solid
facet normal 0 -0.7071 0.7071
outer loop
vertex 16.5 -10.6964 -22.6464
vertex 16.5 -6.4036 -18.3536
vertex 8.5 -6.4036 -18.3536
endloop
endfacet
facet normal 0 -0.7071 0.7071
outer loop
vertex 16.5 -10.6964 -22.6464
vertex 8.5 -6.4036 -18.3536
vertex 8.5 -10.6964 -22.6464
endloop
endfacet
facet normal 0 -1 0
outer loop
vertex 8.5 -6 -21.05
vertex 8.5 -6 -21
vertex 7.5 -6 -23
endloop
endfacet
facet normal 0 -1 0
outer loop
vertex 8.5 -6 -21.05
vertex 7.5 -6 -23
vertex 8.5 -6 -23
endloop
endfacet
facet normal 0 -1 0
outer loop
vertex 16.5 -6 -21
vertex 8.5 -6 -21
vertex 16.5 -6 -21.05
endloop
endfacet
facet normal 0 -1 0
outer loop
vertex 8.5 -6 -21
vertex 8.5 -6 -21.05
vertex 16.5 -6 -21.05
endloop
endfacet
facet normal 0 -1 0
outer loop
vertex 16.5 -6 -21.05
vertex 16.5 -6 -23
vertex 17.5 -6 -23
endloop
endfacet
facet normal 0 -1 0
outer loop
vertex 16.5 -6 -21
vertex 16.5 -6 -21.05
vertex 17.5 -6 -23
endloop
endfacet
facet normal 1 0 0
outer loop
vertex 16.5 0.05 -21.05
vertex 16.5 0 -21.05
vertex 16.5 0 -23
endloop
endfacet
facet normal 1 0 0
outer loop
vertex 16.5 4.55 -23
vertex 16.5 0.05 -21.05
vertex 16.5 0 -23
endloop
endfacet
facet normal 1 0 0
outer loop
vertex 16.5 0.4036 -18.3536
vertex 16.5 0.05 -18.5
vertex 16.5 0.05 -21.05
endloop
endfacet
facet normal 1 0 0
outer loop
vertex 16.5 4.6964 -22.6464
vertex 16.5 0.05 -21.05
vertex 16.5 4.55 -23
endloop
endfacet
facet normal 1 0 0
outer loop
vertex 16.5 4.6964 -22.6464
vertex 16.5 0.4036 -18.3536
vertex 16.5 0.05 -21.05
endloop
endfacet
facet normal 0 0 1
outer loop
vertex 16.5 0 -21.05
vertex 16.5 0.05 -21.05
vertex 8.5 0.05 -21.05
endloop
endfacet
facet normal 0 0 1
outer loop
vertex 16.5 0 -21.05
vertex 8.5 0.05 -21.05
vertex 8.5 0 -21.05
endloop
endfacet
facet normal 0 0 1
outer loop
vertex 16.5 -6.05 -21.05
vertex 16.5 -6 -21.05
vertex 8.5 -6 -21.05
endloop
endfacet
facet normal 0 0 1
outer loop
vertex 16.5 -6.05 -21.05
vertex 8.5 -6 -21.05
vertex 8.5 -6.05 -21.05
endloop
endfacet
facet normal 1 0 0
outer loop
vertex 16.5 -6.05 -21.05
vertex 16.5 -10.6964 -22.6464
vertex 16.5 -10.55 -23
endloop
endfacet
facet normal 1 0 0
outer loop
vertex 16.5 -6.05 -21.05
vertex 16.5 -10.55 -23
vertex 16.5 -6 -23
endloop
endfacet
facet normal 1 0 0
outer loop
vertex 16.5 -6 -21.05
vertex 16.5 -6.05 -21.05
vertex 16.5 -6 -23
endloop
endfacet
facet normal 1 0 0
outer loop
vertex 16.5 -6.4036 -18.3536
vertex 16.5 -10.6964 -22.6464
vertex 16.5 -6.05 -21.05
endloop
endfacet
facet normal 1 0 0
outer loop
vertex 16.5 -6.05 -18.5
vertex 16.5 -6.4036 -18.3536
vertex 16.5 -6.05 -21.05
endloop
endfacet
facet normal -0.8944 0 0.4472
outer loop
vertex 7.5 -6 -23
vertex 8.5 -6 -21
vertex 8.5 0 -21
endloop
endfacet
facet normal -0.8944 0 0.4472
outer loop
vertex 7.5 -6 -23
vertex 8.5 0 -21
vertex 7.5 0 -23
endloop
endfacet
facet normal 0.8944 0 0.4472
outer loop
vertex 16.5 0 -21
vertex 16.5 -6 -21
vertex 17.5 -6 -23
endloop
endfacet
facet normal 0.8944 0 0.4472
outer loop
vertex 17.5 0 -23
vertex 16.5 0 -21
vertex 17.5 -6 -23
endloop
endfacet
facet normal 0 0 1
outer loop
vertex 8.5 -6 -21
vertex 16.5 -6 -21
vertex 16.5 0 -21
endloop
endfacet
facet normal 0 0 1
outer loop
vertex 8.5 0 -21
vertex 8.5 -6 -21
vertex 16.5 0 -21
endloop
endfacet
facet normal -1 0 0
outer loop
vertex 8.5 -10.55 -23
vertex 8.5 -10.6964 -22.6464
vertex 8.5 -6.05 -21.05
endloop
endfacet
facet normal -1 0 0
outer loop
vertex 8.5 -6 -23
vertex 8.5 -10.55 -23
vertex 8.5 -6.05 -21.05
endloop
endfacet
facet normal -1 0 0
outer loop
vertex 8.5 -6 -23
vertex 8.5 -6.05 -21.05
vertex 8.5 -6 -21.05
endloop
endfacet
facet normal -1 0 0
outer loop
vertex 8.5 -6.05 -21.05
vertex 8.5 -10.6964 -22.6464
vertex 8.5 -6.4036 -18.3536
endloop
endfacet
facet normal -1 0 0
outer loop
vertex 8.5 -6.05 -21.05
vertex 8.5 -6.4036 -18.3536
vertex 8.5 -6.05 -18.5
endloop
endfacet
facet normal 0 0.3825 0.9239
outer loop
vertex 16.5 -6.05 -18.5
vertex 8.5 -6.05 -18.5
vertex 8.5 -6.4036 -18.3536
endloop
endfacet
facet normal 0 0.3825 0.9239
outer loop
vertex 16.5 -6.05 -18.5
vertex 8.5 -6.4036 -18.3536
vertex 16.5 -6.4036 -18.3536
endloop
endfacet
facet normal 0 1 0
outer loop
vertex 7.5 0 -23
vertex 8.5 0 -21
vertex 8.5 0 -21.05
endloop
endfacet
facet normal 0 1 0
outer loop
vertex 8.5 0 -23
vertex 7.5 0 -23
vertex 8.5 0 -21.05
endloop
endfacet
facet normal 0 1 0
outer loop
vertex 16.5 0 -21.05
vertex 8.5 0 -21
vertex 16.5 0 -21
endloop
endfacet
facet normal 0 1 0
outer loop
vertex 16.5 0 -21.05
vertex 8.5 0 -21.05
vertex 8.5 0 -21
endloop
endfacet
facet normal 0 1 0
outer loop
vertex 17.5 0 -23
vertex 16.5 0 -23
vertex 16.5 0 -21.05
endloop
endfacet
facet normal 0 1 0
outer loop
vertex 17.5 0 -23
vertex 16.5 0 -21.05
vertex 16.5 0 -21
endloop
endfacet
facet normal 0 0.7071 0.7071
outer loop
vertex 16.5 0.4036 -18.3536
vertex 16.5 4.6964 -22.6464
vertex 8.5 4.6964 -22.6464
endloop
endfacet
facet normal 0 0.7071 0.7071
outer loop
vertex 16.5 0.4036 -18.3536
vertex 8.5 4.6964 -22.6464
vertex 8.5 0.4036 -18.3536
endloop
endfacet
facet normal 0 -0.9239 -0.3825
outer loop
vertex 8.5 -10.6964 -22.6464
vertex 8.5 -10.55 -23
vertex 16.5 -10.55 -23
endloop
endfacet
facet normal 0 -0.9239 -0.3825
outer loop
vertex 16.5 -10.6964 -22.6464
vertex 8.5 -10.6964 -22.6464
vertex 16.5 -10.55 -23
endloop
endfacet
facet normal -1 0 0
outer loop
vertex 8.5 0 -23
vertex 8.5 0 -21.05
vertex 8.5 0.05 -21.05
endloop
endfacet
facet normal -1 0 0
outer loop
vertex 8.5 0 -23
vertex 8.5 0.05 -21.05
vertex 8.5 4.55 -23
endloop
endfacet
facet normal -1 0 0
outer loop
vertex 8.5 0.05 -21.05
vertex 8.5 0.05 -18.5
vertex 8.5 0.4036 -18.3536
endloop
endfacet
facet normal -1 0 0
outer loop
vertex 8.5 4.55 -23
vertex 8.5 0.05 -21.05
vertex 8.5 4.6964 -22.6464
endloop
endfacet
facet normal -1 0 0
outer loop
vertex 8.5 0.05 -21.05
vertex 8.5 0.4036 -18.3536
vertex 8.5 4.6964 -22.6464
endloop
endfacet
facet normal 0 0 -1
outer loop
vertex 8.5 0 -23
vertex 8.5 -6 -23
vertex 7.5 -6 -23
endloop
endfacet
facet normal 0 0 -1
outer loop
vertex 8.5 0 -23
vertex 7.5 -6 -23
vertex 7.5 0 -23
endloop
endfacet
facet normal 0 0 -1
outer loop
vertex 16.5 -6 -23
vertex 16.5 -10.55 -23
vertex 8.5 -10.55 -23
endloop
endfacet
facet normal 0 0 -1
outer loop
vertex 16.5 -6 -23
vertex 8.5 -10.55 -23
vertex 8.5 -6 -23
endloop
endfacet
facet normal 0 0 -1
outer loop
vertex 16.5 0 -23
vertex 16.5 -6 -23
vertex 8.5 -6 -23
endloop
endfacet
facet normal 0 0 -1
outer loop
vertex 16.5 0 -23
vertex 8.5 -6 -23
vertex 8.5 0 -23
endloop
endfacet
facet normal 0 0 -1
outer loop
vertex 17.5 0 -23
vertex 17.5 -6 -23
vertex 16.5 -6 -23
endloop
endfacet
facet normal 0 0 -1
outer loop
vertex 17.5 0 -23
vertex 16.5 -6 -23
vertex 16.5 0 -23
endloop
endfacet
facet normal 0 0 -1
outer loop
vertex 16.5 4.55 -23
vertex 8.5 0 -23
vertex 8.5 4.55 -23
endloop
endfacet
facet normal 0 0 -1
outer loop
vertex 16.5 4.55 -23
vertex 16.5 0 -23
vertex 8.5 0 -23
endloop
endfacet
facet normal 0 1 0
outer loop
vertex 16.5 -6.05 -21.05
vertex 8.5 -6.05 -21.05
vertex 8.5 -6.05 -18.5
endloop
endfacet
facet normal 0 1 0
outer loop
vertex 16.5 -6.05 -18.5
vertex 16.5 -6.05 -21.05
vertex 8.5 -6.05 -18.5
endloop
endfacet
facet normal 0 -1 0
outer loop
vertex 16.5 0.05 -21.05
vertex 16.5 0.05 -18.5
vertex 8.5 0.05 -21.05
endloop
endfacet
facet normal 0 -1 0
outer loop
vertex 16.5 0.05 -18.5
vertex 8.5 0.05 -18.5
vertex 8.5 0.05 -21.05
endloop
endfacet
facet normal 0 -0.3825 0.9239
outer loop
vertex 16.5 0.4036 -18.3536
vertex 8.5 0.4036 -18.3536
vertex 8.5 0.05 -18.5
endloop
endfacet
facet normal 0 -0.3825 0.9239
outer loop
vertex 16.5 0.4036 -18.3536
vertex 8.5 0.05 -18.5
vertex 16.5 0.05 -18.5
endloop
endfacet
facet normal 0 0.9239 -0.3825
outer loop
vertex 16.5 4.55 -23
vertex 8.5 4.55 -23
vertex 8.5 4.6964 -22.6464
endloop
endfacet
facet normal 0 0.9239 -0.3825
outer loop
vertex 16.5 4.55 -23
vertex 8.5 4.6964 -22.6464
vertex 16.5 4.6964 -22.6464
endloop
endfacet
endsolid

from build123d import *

# Parameters (mm, degrees)
PAD001_DEPTH    = 8
SKETCH009_W     = 6
SKETCH009_H     = 10
PAD004_DEPTH    = 2
POCKET005_DEPTH = 11.051
CHAMFER_SIZE    = 0.5


with BuildPart() as part:
    # Sketch003 → Pad001 (new body)
    with BuildSketch(Plane.YZ):
        Polygon((-3.05, 2.5), (-8.05, -2.5), (8.05, -2.5), (3.05, 2.5), (3.05, -0.55), (-3.05, -0.55), align=None)
    extrude(amount=PAD001_DEPTH)

    # Sketch009 (on Face2 of Pad001) → Pad004 (join)
    with BuildSketch(Plane.YX.offset(2.5)):
        with Locations((0, 4)):
            Rectangle(SKETCH009_W, SKETCH009_H)
    extrude(amount=-PAD004_DEPTH)

    # Sketch010 (on Face8 of Pad004) → Pocket005 (cut, through all)
    with BuildSketch(Plane(origin=(0, -3, 0), x_dir=(0, 0, -1), z_dir=(0, -1, 0))):
        Polygon((2.5, 9), (0.5, 9), (0.5, 8), align=None)
        Polygon((2.5, -1), (0.5, -1), (0.5, 0), align=None)
    extrude(amount=-POCKET005_DEPTH, mode=Mode.SUBTRACT)

    # Chamfer
    chamfer_edges = [part.edges().sort_by_distance(p)[0] for p in [
        (4, -3.05, 2.5),
        (4, 3.05, 2.5),
        (4, -8.05, -2.5),
        (4, 8.05, -2.5),
    ]]
    chamfer(chamfer_edges, length=CHAMFER_SIZE)


with BuildPart() as part_1:
    # Body001 placement: moved
    add(part.part.moved(Location((8.5, -3, -20.5))))


solid = part_1.part
